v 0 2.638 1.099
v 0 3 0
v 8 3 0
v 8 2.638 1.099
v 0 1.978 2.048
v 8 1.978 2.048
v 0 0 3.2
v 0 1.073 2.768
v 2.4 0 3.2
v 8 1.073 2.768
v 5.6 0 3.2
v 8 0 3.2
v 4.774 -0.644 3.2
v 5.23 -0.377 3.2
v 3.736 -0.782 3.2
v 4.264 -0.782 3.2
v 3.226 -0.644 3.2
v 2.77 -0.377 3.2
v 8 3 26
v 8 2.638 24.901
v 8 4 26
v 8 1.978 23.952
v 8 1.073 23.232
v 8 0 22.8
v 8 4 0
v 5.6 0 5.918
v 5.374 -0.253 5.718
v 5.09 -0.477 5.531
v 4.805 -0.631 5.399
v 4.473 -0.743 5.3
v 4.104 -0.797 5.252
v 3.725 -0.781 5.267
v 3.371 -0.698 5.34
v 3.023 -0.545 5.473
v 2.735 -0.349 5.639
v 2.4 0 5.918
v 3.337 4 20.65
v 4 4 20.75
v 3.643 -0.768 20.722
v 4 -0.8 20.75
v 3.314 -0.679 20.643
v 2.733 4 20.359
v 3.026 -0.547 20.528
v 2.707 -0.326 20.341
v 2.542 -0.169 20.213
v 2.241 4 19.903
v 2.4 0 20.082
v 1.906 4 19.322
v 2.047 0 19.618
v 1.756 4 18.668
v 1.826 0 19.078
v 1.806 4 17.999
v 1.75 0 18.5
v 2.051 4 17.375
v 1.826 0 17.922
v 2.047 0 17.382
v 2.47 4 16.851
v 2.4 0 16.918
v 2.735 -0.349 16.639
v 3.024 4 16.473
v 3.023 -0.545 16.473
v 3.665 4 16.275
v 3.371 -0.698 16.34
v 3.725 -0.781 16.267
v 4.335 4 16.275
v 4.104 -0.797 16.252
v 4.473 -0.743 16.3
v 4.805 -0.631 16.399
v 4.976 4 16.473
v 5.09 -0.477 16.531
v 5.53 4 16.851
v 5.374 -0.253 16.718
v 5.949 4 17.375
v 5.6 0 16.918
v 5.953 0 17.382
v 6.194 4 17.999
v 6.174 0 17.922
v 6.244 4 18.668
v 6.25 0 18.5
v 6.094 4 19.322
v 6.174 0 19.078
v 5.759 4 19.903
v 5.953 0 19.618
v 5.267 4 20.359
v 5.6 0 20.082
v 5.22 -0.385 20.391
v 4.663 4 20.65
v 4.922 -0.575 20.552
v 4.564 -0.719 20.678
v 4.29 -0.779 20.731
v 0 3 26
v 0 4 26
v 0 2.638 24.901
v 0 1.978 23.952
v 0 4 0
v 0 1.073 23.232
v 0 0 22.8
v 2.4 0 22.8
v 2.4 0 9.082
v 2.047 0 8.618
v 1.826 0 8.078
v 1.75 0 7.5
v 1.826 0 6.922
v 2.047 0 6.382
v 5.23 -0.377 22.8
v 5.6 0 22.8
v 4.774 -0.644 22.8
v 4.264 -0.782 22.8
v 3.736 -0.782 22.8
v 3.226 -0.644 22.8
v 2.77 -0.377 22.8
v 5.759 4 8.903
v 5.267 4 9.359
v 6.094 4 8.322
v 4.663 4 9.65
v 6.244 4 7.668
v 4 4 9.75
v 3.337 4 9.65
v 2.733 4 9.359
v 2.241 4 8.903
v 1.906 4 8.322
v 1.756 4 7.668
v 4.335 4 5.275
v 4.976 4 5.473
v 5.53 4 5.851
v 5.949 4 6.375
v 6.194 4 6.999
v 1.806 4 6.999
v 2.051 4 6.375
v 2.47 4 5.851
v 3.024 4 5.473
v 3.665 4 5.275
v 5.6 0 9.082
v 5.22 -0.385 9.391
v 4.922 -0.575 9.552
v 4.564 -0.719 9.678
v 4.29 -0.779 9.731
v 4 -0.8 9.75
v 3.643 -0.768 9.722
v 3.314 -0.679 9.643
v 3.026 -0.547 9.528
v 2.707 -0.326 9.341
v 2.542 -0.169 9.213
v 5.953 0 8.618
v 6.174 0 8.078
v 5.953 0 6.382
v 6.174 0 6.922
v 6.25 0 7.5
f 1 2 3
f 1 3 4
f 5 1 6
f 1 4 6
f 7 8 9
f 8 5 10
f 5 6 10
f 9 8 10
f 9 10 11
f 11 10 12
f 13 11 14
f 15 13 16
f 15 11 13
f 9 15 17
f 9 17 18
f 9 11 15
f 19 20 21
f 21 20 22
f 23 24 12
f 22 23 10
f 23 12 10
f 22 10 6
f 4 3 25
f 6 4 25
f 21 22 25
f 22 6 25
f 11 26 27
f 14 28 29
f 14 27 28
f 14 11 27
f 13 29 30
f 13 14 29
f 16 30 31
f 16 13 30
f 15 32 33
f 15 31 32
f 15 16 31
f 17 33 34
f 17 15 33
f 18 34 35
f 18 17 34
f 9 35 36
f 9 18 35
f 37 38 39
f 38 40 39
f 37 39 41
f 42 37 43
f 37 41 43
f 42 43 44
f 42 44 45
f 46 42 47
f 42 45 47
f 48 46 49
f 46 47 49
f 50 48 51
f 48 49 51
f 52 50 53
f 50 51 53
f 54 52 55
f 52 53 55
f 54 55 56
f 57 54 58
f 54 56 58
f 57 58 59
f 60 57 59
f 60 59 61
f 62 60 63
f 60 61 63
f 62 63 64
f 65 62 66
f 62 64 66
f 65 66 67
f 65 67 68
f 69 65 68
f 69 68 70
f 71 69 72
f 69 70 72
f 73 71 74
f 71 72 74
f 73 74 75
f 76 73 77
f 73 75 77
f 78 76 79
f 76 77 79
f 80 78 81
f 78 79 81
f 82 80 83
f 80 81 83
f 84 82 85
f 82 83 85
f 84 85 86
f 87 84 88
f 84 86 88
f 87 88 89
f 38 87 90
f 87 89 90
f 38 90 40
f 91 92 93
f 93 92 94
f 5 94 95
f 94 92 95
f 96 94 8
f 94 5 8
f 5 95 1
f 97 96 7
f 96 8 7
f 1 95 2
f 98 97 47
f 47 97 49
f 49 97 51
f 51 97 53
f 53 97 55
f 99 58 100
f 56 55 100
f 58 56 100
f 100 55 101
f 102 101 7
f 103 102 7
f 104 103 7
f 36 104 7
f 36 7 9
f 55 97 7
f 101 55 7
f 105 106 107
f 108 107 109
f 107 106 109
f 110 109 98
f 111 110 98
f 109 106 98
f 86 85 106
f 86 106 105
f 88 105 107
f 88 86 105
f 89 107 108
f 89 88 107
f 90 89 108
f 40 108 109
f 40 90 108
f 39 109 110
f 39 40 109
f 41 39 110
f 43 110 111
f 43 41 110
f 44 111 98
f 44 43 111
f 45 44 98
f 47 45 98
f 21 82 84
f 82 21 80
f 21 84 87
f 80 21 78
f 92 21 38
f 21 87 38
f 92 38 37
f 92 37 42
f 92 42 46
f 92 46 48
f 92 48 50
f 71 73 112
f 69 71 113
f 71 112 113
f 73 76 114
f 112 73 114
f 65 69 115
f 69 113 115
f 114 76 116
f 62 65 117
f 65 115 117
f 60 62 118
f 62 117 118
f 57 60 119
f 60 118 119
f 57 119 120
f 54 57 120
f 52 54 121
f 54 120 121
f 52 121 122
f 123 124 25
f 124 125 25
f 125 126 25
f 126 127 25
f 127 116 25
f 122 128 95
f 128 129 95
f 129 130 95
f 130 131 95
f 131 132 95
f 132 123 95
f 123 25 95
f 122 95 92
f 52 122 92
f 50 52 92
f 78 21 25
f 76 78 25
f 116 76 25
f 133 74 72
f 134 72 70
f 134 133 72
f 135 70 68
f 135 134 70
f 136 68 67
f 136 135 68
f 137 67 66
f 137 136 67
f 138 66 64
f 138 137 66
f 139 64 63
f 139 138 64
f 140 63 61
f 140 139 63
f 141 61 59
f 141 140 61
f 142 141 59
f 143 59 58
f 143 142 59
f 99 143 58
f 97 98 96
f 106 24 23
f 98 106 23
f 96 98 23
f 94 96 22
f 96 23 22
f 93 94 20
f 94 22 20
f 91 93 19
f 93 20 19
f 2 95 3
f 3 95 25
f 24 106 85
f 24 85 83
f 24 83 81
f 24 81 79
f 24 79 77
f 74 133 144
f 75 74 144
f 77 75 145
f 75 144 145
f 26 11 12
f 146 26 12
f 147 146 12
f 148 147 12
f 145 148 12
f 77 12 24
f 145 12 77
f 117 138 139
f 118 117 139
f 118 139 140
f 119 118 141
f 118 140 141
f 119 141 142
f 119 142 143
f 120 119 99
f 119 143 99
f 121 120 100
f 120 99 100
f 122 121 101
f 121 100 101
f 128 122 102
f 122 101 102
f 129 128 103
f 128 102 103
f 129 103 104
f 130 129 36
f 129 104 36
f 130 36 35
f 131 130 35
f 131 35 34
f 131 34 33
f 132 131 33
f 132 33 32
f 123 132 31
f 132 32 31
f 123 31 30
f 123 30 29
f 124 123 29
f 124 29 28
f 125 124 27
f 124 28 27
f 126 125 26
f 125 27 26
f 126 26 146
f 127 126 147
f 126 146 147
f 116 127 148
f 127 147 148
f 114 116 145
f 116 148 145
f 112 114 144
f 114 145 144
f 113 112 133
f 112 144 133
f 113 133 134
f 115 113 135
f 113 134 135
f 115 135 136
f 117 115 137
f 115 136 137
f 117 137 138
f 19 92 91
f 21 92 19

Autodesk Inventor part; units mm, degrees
ref_plane "YZ Plane" through (0, 0, 0) normal (1, 0, 0) x (0, 1, 0)
ref_plane "XZ Plane" through (0, 0, 0) normal (0, 1, 0) x (-1, 0, 0)
ref_plane "XY Plane" through (0, 0, 0) normal (0, 0, 1) x (1, 0, 0)
sketch "Sketch1" plane through (0, 0, 0) normal (0, 0, 1) x (1, 0, 0)
  line L0 (0, 0) -> (8, 0)
  line L1 (8, 0) -> (8, 4)
  line L2 (8, 4) -> (0, 4)
  line L3 (0, 4) -> (0, 0)
  dimension "d0" = 8
  dimension "d1" = 4
extrude "Extrusion1" add sketch "Sketch1" along normal blind 26
sketch "Sketch3" plane through (8, 0, 0) normal (1, 0, 0) x (0, 0, -1)
  line L0 (0, 0) -> (0, 4) projected
  line L1 (-26, 0) -> (-26, 4) projected
  line L2 (0, 0) -> (-26, 0) projected
  arc A0 (-22.8, 0) -> (-26, 3) centre (-26.6879, -0.9404) ccw
  arc A1 (0, 3) -> (-3.2, 0) centre (0.6879, -0.9404) ccw
  dimension "d14" = 4
  dimension "d15" = 3.2
  dimension "d16" = 1
extrude "Extrusion2" cut sketch "Sketch3" against normal up to next
ref_plane "Work Plane1" through (0, 0, 3.2) normal (0, 0, -1) x (-1, 0, 0)
sketch "Sketch4" plane through (0, 0, 3.2) normal (0, 0, -1) x (-1, 0, 0)
  line L0 (0, 0) -> (-8, 0) projected
  line L1 (-8, 0) -> (0, 0) projected
  arc A0 (-5.6, 0) -> (-2.4, 0) centre (-4, 1.2) ccw
  line L2 (-8, 0) -> (-8, 3) projected
  line L3 (-5.6, 0) -> (-2.4, 0)
  dimension "d20" = 2
  dimension "d21" = 4
  dimension "d22" = 1.2
extrude "Extrusion3" add sketch "Sketch4" against normal blind 19.6
sketch "Sketch2" plane through (0, 4, 0) normal (0, 1, 0) x (1, 0, 0)
  line L0 (8, -26) -> (0, -26) projected
  line L1 (8, 0) -> (8, -26) projected
  point P0 (4, -7.5)
  point P1 (4, -18.5)
  dimension "d4" = 11
  dimension "d5" = 7.5
  dimension "d6" = 4
hole "Hole1" at (4, 4, 7.5) at (4, 4, 18.5) direction (0, -1, 0) diameter 4.5 end through all
properties part number "OfflineBowdenExtruderSpringHandle" material "ABS Plastic"
